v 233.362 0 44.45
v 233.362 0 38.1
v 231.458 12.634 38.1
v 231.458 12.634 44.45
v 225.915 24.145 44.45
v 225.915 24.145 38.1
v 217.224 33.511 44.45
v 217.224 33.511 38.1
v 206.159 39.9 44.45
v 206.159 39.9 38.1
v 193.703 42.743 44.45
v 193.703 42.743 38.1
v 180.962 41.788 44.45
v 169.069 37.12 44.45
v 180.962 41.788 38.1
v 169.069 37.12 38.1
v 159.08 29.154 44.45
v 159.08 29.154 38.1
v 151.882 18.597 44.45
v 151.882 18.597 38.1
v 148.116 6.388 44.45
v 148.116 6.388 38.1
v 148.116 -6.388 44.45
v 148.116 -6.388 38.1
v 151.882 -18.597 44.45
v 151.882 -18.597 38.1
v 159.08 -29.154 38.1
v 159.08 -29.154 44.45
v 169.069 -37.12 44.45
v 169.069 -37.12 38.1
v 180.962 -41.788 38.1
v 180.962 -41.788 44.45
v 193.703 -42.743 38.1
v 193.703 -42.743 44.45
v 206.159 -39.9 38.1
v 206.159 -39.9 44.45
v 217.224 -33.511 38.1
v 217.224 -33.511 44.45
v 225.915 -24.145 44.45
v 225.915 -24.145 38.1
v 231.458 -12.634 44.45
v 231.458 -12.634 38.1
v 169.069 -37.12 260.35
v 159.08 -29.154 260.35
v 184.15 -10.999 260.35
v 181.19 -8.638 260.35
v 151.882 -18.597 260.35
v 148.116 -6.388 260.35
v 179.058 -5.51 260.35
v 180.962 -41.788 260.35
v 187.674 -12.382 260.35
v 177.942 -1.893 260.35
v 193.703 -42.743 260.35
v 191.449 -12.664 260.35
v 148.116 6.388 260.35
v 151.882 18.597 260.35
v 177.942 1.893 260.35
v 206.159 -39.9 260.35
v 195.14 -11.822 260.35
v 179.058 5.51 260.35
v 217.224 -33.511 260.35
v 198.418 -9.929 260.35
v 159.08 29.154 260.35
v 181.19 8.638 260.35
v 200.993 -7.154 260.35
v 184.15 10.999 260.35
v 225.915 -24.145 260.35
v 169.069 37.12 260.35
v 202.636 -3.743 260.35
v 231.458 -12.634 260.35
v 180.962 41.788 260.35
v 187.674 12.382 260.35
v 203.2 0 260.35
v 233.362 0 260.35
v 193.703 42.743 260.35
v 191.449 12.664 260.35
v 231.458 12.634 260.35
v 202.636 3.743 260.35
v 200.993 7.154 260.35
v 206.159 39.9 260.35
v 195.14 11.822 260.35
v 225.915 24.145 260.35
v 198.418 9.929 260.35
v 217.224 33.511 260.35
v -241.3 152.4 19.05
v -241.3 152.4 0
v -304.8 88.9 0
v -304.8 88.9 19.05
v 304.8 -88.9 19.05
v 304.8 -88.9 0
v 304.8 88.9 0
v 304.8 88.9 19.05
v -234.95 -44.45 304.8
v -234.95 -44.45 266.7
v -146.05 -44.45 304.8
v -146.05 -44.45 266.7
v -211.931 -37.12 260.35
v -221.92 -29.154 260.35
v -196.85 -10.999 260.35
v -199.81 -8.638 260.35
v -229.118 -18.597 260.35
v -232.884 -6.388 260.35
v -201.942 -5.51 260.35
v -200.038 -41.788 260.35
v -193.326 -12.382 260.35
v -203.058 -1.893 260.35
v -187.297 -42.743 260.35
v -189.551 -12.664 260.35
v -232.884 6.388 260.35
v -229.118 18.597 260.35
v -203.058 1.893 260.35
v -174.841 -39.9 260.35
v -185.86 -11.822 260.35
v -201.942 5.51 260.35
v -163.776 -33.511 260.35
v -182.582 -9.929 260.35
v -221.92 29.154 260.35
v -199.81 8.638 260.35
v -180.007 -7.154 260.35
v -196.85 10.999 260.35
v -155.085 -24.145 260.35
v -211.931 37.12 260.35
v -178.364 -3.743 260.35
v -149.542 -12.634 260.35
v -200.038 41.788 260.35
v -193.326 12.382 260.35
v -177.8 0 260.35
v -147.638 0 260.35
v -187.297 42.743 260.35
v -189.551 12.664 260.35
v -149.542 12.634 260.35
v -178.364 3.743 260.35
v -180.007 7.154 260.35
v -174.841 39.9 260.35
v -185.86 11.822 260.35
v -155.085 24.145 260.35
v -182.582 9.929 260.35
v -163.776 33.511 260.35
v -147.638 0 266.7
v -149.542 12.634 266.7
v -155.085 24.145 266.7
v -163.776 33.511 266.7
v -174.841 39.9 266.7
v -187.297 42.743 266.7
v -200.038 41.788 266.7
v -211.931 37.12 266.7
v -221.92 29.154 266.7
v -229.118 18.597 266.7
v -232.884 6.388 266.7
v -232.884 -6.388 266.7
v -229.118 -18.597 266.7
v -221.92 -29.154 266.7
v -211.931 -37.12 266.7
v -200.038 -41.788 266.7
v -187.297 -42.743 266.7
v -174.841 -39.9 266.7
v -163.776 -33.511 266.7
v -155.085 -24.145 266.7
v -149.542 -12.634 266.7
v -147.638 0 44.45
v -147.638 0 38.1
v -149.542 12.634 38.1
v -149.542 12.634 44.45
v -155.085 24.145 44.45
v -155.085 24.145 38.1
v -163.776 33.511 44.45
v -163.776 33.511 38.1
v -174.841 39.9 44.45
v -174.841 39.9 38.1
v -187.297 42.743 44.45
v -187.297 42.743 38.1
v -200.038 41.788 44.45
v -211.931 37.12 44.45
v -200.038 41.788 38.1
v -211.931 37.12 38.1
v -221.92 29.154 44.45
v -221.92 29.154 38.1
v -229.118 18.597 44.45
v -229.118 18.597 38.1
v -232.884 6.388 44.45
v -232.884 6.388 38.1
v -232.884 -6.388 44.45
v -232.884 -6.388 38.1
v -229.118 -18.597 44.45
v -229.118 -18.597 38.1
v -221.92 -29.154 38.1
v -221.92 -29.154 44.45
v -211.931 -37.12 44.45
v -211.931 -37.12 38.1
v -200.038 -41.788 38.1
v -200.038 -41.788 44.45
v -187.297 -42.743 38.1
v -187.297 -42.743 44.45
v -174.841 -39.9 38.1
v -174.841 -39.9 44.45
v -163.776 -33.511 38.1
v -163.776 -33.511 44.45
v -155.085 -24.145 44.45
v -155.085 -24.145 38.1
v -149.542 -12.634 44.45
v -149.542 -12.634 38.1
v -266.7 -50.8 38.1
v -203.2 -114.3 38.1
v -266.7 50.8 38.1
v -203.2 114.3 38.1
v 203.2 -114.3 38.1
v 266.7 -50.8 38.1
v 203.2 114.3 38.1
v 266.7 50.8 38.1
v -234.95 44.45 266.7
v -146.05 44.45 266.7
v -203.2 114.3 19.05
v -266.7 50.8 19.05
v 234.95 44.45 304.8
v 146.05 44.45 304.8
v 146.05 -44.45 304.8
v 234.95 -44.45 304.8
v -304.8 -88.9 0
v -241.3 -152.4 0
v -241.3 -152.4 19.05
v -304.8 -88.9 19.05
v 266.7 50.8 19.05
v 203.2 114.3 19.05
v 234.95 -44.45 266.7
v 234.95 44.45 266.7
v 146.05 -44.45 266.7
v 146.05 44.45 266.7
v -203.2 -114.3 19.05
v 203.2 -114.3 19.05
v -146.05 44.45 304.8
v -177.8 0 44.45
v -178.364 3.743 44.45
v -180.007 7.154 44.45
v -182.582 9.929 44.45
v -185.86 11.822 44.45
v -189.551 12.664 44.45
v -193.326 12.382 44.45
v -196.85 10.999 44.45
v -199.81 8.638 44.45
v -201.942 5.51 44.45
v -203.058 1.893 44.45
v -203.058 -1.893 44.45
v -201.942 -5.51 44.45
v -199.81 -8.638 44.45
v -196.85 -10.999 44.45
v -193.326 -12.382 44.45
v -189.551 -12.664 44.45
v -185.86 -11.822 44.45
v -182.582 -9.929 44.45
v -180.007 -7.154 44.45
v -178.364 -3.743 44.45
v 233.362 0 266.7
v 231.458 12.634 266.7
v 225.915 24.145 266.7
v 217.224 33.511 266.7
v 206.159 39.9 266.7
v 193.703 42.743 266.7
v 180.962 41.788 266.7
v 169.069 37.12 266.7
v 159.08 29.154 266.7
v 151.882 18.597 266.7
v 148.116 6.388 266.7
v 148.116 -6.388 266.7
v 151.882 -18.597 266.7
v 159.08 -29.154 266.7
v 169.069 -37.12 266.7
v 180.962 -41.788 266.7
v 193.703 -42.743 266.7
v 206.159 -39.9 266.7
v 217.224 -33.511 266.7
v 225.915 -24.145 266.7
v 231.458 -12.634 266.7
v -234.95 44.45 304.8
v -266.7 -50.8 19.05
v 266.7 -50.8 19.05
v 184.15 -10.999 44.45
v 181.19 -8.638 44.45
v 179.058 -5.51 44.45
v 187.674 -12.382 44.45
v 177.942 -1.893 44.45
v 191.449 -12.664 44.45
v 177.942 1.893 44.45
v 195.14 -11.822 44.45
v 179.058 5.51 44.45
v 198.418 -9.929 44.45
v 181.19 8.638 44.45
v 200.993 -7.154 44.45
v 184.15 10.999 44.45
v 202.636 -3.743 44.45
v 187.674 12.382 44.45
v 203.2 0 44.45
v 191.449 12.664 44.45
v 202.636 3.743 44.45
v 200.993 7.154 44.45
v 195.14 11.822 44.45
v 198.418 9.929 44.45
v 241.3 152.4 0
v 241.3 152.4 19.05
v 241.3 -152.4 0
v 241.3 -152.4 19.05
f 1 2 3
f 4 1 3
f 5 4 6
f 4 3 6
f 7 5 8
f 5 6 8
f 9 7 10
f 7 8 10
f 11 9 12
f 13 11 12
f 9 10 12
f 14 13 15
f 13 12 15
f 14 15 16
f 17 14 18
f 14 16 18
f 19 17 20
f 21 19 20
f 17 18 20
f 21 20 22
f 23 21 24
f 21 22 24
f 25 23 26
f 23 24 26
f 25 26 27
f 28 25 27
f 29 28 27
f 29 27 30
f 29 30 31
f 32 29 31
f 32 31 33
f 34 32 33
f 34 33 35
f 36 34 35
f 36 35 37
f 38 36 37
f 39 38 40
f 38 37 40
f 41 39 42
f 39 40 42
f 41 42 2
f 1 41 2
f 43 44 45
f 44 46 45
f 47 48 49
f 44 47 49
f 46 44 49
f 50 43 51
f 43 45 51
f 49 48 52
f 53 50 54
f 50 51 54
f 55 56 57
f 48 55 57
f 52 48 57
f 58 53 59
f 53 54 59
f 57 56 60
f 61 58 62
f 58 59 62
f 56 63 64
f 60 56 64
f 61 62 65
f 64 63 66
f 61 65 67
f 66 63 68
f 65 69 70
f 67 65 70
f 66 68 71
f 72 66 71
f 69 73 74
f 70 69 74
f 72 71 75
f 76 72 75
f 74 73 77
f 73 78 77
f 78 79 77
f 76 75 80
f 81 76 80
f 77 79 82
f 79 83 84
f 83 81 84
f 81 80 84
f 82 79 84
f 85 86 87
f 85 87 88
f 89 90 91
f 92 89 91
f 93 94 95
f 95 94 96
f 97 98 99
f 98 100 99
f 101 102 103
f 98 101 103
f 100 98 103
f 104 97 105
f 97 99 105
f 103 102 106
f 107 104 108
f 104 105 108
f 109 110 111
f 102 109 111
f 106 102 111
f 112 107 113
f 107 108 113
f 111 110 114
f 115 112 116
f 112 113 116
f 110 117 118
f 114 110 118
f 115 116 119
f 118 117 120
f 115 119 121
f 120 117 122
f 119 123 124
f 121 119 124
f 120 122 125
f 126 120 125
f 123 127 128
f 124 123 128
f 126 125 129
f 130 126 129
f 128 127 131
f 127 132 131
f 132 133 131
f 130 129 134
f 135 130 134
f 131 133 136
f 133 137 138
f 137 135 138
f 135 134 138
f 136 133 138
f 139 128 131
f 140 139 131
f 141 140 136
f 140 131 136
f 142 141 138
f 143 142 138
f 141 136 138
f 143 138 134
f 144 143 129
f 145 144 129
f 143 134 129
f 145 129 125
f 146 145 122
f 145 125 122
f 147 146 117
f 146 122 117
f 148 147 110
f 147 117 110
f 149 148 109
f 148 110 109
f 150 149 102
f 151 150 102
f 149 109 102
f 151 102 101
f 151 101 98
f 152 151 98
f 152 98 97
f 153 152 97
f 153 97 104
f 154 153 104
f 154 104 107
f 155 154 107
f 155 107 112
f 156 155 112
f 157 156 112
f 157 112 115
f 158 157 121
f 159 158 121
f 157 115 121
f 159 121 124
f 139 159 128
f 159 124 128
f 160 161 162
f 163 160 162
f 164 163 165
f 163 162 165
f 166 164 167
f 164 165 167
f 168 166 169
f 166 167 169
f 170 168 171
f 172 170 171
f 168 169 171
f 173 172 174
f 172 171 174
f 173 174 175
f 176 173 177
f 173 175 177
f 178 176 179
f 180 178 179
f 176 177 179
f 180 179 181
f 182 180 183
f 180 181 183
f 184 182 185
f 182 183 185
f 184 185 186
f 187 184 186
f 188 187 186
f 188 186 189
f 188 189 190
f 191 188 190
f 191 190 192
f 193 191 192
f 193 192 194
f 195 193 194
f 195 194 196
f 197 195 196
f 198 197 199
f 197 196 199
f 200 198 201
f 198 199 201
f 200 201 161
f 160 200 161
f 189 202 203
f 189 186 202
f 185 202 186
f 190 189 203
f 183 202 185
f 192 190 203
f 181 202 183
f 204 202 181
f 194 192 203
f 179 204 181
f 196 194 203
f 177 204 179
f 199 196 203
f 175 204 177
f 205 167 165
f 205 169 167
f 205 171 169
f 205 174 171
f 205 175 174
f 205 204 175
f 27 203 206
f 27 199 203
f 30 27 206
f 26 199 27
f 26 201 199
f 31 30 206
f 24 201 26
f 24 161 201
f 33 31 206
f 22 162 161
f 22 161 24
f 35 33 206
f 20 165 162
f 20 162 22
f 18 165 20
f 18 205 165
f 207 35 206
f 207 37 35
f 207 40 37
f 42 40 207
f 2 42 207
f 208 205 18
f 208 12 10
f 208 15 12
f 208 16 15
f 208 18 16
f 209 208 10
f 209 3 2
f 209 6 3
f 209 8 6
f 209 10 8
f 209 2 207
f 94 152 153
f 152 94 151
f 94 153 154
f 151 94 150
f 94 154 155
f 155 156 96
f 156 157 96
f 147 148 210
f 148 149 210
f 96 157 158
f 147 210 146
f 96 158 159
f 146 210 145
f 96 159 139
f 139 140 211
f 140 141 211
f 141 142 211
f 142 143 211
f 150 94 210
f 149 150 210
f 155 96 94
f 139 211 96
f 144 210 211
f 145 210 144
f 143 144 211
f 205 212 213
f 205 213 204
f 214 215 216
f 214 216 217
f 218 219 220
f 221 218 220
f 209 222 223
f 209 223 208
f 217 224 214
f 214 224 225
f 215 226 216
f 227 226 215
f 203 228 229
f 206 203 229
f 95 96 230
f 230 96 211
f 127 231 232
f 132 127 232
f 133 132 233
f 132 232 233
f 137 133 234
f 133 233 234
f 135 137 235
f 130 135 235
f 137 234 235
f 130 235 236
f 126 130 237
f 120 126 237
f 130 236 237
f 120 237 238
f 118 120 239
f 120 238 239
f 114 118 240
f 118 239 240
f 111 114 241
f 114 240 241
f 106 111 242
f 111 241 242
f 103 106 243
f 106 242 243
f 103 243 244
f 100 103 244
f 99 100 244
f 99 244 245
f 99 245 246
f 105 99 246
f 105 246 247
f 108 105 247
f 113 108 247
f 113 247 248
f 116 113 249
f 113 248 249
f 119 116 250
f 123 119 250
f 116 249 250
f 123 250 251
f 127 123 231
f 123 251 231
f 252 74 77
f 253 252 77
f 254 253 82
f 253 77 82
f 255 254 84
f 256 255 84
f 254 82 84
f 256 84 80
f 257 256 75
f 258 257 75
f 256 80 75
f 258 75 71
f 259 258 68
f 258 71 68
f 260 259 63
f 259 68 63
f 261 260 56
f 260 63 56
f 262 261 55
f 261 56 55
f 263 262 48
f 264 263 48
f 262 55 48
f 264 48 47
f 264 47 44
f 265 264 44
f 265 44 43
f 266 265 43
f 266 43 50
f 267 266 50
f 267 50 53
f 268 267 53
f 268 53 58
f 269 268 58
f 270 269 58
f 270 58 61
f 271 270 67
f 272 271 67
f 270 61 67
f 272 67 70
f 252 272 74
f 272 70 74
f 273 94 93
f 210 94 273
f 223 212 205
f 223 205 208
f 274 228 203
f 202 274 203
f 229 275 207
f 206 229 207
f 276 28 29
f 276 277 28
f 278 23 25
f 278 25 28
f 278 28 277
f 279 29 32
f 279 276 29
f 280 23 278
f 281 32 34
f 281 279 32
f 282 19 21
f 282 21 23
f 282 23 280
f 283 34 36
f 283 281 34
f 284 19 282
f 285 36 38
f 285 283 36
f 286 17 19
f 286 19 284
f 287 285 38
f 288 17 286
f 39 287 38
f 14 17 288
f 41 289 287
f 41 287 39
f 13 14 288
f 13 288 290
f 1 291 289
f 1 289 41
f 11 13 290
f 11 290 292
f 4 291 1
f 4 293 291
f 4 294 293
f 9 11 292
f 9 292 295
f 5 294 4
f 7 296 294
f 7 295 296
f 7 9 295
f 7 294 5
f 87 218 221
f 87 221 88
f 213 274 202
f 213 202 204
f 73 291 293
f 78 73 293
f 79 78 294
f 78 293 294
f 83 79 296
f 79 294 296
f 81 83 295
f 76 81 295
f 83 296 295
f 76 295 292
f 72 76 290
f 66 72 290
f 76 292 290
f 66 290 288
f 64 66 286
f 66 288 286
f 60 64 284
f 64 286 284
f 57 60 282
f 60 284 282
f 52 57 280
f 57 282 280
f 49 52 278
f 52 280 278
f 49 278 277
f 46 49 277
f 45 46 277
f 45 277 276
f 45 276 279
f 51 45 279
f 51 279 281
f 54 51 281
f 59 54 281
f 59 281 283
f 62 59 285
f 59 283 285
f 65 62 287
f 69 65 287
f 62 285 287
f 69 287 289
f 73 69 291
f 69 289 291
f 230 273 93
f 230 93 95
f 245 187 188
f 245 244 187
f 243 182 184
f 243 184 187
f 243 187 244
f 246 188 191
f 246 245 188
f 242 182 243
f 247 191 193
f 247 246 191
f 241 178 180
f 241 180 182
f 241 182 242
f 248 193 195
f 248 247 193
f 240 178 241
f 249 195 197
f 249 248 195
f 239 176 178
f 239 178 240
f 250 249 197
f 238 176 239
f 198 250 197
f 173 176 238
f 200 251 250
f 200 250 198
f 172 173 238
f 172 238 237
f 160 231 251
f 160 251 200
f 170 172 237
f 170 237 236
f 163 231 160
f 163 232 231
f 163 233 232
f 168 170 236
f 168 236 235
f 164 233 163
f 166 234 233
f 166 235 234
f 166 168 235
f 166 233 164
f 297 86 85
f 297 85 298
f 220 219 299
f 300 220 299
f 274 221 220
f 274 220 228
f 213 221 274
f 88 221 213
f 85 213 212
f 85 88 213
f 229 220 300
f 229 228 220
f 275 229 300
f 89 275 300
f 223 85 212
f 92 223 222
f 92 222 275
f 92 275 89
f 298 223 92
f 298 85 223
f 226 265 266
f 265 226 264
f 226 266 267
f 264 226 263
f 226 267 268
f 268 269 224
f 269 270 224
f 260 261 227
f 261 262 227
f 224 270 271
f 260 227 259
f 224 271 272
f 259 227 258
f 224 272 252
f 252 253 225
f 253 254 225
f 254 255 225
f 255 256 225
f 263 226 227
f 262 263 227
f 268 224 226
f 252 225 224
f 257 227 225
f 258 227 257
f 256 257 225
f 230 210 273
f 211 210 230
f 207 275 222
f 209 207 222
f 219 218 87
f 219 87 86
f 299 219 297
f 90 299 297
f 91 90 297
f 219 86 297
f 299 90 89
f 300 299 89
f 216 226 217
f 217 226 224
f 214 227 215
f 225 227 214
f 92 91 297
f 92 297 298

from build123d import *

# Parameters (mm, degrees)
F0_W      = 609.6
F0_H      = 304.8
F1_DEPTH  = 19.05
F2_W      = 533.4
F2_H      = 228.6
F3_DEPTH  = 19.05
F4_R      = 42.8625
F5_DEPTH  = 6.35
F6_R      = 12.7
F7_DEPTH  = 215.9
F8_R      = 42.8625
F9_DEPTH  = 6.35
F10_W     = 88.9
F10_H     = 88.9
F11_DEPTH = 38.1
F12_SIZE  = 63.5


with BuildPart() as f1:
    # F0 (on Top) → F1 (new body)
    with BuildSketch(Plane.XY):
        Rectangle(F0_W, F0_H)
    extrude(amount=F1_DEPTH)

    # F2 (on face) → F3 (join)
    with BuildSketch(Plane.XY.offset(19.05)):
        Rectangle(F2_W, F2_H)
    extrude(amount=F3_DEPTH)

    # F4 (on face) → F5 (join)
    with BuildSketch(Plane.XY.offset(38.1)):
        with Locations((-190.5, 0)):
            Circle(F4_R)
        with Locations((190.5, 0)):
            Circle(F4_R)
    extrude(amount=F5_DEPTH)

    # F6 (on face) → F7 (join)
    with BuildSketch(Plane.XY.offset(44.45)):
        with Locations((-190.5, 0)):
            Circle(F6_R)
        with Locations((190.5, 0)):
            Circle(F6_R)
    extrude(amount=F7_DEPTH)

    # F8 (on face) → F9 (join)
    with BuildSketch(Plane.XY.offset(260.35)):
        with Locations((-190.5, 0)):
            Circle(F8_R)
        with Locations((190.5, 0)):
            Circle(F8_R)
    extrude(amount=F9_DEPTH)

    # F10 (on face) → F11 (join)
    with BuildSketch(Plane.XY.offset(266.7)):
        with Locations((-190.5, 0)):
            Rectangle(F10_W, F10_H)
        with Locations((190.5, 0)):
            Rectangle(F10_W, F10_H)
    extrude(amount=F11_DEPTH)

    # F12
    f12_edges = [f1.edges().sort_by_distance(p)[0] for p in [
        (-266.7, 114.3, 28.575),
        (-266.7, -114.3, 28.575),
        (-304.8, -152.4, 9.525),
        (-304.8, 152.4, 9.525),
        (266.7, 114.3, 28.575),
        (266.7, -114.3, 28.575),
        (304.8, 152.4, 9.525),
        (304.8, -152.4, 9.525),
    ]]
    chamfer(f12_edges, length=F12_SIZE)


solid = f1.part
